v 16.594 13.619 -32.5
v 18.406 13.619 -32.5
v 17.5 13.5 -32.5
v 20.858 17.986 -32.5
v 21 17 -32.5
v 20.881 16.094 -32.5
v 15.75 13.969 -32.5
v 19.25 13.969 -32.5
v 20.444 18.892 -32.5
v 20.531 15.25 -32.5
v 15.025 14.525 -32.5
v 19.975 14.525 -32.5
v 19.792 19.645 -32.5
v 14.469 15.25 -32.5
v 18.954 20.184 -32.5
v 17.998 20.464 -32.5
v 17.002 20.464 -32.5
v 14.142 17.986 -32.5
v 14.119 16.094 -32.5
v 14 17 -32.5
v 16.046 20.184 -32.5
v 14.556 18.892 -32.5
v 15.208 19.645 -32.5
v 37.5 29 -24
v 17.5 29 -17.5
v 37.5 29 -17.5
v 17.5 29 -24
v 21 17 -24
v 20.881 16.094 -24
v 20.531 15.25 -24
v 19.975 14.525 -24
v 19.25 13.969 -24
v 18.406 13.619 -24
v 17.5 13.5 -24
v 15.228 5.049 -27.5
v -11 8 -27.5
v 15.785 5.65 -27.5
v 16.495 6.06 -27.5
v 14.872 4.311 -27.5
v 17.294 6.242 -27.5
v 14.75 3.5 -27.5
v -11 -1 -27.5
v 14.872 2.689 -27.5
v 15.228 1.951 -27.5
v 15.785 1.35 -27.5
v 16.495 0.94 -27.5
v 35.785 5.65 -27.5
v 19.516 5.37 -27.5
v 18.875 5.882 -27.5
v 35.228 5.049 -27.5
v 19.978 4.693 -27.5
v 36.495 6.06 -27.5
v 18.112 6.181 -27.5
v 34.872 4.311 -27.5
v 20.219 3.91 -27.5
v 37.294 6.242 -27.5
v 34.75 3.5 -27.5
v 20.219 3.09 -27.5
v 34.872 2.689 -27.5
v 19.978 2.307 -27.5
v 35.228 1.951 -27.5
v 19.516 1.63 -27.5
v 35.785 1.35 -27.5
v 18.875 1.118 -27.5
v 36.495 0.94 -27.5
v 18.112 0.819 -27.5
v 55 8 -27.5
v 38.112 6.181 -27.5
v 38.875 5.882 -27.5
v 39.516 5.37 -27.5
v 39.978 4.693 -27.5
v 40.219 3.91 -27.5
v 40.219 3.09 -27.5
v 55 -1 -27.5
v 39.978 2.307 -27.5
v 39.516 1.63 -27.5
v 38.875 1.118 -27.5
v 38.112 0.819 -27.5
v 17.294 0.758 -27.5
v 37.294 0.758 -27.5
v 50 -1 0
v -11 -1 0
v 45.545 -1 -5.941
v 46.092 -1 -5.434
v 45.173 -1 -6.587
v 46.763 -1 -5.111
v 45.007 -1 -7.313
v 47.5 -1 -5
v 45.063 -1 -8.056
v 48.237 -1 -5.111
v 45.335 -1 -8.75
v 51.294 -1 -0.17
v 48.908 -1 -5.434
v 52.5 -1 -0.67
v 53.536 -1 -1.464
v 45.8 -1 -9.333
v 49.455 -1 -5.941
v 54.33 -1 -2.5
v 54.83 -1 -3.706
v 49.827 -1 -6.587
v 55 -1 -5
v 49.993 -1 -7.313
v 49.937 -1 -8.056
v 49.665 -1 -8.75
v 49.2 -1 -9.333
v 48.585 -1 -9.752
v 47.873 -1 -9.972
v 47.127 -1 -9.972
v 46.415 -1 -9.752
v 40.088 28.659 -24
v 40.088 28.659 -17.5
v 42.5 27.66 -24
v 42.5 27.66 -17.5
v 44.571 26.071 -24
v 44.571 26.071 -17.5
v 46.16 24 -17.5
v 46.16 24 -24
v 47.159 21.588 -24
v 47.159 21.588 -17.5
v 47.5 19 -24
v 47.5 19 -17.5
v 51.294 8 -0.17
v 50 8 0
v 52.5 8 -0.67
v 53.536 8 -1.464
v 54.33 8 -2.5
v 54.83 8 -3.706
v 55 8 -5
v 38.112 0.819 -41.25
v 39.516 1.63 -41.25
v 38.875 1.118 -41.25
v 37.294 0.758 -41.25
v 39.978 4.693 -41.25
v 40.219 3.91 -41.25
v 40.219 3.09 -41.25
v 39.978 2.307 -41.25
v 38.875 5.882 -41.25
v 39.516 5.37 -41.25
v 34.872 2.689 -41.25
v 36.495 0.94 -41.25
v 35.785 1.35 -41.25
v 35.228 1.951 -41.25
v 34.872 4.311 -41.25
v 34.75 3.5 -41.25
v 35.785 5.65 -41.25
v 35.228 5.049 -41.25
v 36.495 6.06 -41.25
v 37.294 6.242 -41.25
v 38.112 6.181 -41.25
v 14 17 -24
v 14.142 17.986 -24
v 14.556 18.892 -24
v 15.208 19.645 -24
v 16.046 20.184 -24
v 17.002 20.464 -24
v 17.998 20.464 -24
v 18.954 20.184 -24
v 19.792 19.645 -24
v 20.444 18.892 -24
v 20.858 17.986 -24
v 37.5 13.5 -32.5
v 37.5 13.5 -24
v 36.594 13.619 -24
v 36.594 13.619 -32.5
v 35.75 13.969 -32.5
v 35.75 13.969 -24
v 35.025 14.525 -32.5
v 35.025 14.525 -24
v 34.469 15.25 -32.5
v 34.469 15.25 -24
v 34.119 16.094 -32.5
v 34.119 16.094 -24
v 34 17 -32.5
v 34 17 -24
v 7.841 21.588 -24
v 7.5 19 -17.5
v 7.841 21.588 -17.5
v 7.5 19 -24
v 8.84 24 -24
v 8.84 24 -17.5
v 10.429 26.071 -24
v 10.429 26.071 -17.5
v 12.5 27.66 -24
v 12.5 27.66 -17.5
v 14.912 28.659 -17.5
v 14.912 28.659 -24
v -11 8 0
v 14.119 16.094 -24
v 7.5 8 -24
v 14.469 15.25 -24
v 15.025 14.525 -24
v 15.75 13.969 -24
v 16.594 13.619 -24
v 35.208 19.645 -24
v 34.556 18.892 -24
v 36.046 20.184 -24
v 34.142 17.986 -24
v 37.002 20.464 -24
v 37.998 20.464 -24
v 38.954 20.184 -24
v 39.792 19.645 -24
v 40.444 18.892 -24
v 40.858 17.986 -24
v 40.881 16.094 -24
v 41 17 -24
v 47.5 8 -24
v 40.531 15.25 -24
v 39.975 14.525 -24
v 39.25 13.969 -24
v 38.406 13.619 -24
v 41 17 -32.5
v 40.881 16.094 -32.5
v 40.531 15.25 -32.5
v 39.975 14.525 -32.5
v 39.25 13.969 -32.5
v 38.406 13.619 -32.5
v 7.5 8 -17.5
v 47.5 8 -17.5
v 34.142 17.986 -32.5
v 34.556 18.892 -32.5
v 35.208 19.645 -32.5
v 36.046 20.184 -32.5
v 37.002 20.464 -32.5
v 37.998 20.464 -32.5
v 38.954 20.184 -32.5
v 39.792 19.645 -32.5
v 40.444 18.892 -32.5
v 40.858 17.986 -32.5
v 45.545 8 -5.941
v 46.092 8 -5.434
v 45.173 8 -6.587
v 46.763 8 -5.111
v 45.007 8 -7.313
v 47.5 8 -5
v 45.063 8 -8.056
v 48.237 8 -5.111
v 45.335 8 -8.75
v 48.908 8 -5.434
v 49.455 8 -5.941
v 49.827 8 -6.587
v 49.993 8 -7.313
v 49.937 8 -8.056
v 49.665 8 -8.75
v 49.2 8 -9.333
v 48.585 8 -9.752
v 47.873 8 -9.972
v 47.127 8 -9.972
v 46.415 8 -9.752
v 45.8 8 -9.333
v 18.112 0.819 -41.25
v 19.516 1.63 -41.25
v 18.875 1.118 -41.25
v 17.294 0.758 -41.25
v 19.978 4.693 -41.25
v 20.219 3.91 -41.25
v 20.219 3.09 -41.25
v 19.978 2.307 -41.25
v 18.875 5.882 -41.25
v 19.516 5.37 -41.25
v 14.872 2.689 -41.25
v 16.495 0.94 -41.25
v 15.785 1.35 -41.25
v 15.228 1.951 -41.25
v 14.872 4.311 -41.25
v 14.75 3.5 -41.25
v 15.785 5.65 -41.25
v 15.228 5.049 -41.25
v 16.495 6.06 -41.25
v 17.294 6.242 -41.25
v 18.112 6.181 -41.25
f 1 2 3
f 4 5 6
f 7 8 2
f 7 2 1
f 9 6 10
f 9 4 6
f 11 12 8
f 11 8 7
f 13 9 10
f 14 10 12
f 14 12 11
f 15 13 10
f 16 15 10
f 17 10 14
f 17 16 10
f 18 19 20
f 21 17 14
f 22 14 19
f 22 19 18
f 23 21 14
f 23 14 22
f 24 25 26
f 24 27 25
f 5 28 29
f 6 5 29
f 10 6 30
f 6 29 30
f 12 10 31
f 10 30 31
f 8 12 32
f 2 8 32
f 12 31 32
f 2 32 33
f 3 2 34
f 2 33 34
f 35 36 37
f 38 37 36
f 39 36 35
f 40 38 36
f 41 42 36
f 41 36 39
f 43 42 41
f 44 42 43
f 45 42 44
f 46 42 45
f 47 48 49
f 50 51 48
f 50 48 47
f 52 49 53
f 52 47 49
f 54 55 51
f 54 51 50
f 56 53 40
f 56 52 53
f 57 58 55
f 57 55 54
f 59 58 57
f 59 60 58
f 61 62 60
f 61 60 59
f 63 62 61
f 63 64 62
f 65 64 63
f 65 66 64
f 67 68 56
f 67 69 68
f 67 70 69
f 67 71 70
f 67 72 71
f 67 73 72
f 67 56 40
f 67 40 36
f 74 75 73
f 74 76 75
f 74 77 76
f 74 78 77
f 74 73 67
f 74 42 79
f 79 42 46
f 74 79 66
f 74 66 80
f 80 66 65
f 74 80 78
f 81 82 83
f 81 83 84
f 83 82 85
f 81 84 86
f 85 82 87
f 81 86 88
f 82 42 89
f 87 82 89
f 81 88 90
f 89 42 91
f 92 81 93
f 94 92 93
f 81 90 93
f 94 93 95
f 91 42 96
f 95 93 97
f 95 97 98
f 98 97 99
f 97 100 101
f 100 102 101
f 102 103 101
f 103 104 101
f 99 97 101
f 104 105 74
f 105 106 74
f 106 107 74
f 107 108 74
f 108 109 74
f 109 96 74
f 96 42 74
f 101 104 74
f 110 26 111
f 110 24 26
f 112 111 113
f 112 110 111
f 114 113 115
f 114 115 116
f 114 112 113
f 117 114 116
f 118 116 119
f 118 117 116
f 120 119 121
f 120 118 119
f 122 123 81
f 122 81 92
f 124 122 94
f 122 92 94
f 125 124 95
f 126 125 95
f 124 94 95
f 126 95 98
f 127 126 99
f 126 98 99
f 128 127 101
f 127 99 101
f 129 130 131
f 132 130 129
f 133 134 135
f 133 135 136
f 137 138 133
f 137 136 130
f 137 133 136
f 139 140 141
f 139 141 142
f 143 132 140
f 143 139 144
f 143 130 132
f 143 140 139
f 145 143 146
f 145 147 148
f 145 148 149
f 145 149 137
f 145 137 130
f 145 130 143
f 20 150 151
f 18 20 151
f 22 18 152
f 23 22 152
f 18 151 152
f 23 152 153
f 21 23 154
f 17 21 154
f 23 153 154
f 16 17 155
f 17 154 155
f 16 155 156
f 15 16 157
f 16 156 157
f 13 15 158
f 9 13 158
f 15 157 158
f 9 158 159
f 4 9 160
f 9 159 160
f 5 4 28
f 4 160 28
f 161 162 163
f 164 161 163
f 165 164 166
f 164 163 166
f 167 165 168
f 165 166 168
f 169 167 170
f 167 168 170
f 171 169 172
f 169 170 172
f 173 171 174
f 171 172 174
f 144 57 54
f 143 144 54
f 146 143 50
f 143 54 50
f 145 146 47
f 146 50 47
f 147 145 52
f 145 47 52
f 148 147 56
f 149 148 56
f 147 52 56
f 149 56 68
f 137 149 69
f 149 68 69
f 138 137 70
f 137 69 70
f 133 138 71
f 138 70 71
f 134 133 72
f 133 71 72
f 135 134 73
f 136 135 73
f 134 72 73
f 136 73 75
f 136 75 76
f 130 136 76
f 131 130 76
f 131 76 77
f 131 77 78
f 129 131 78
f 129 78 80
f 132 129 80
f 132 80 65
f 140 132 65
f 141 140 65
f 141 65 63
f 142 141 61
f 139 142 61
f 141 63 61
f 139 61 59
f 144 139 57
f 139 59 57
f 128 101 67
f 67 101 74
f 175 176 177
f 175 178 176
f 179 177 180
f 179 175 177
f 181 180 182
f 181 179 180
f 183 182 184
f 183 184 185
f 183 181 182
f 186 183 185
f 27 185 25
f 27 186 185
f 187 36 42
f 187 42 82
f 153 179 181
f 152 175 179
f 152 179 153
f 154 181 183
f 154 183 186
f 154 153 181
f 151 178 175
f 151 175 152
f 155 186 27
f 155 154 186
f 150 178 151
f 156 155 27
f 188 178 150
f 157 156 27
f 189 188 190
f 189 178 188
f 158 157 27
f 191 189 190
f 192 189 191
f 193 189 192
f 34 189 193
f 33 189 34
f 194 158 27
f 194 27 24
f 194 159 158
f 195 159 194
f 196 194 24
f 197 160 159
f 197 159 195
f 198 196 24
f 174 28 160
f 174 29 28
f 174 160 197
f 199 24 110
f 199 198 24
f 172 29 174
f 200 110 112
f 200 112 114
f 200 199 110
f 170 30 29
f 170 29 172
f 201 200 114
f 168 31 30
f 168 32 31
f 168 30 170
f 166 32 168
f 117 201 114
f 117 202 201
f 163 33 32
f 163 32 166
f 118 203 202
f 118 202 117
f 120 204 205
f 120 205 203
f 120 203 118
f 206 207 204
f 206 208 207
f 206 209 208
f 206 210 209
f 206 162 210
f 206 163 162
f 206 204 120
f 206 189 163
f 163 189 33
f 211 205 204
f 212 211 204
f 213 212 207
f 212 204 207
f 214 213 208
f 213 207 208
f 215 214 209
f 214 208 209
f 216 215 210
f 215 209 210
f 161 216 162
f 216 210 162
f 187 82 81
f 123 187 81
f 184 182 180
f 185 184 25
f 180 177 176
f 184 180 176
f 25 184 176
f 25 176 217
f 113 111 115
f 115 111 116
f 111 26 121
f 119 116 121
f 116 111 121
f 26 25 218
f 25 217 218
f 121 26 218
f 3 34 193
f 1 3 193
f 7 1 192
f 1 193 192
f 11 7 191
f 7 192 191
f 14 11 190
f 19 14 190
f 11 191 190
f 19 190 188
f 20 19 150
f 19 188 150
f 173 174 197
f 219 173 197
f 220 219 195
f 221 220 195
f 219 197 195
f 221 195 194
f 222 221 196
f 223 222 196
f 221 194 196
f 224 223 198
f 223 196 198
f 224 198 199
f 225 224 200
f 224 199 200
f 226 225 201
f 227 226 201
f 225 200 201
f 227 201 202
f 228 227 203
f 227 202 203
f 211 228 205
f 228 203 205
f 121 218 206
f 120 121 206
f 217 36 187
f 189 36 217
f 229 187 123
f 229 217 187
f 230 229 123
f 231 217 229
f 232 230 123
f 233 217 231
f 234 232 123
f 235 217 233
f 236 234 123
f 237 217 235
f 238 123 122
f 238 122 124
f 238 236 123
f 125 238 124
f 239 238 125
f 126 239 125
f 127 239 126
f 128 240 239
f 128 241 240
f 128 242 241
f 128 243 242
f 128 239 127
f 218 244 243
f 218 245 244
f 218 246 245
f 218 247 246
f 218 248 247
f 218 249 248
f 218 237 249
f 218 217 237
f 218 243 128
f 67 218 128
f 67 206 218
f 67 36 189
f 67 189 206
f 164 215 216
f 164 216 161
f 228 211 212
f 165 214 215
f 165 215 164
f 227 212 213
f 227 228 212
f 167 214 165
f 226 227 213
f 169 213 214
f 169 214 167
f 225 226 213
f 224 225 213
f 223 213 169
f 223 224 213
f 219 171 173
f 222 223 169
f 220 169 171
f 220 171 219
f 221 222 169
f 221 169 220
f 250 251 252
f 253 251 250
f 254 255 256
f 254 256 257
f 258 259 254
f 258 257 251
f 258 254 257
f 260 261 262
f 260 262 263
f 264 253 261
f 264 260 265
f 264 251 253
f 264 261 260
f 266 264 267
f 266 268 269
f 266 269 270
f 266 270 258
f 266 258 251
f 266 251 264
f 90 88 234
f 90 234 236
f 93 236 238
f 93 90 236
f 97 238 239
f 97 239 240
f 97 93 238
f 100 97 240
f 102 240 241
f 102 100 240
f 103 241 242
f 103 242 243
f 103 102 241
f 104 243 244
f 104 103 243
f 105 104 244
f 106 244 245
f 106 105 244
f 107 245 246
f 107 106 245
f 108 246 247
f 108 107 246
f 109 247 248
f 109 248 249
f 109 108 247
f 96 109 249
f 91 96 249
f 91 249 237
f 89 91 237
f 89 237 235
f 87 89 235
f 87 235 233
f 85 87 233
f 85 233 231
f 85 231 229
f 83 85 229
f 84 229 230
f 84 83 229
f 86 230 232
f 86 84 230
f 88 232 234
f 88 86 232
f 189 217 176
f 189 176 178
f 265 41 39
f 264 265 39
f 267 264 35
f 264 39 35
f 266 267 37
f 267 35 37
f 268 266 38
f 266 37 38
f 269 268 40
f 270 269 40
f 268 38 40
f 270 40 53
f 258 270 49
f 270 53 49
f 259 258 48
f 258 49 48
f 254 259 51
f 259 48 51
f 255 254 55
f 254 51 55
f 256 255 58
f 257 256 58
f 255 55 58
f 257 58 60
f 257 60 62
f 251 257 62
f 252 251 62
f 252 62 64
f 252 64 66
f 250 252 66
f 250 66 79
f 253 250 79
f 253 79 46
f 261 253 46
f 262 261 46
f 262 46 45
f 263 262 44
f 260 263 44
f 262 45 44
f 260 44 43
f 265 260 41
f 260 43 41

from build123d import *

# Parameters (mm, degrees)
BOSS_EXTRUDE2_DEPTH      = 8
BOSS_EXTRUDE2_DEPTH_BACK = 1
SKETCH1_R                = 2.5
CUT_EXTRUDE1_START       = -18
SKETCH2_R                = 2.5
CUT_EXTRUDE1_DEPTH       = 18
SKETCH3_R                = 2.75
BOSS_EXTRUDE3_DEPTH      = 13.75
SKETCH4_W                = 9
SKETCH4_H                = 6.5
BOSS_EXTRUDE4_DEPTH      = 15
BOSS_EXTRUDE5_DEPTH      = 8.5
SKETCH8_W                = 9
SKETCH8_H                = 6.5
BOSS_EXTRUDE6_DEPTH      = 6
SKETCH9_W                = 15.5
SKETCH9_H                = 6.5
BOSS_EXTRUDE7_DEPTH      = 21
SKETCH10_R               = 3.5
BOSS_EXTRUDE8_DEPTH      = 8.5
CUT_EXTRUDE2_START       = -8.5
SKETCH12_R               = 3.5
CUT_EXTRUDE2_DEPTH       = 8.5
FILLET1_R                = 10
BOSS_EXTRUDE9_DEPTH      = 11
BOSS_EXTRUDE9_DEPTH_BACK = 10
SKETCH13_W               = 27.5
SKETCH13_H               = 9


with BuildPart() as part:
    # Sketch1 → Boss-Extrude2 (new, two sides: drawn at the far end of the back side and taken through both)
    with BuildSketch(Plane(origin=(0, 0, 0), x_dir=(1, 0, 0), z_dir=(0, 1, 0)).offset(-BOSS_EXTRUDE2_DEPTH_BACK)):
        with BuildLine():
            Line((5, 0), (50, 0))
            ThreePointArc((50, 0), (53.535533906, 1.464466094), (55, 5))
            Line((55, 5), (55, 50))
            ThreePointArc((55, 50), (53.535533906, 53.535533906), (50, 55))
            Line((50, 55), (5, 55))
            ThreePointArc((5, 55), (1.464466094, 53.535533906), (0, 50))
            Line((0, 50), (0, 5))
            ThreePointArc((0, 5), (1.464466094, 1.464466094), (5, 0))
        make_face()
        with Locations((7.5, 47.5)):
            Circle(SKETCH1_R, mode=Mode.SUBTRACT)
        with Locations((47.5, 47.5)):
            Circle(SKETCH1_R, mode=Mode.SUBTRACT)
        with Locations((47.5, 7.5)):
            Circle(SKETCH1_R, mode=Mode.SUBTRACT)
        with Locations((7.5, 7.5)):
            Circle(SKETCH1_R, mode=Mode.SUBTRACT)
    extrude(amount=BOSS_EXTRUDE2_DEPTH + BOSS_EXTRUDE2_DEPTH_BACK)

    # Sketch2 → Cut-Extrude1 (cut)
    with BuildSketch(Plane(origin=(0, 8, 0), x_dir=(1, 0, 0), z_dir=(0, 1, 0)).offset(CUT_EXTRUDE1_START)):
        with BuildLine():
            Line((0, 50), (0, 27.5))
            Line((0, 27.5), (55, 27.5))
            Line((55, 27.5), (55, 50))
            ThreePointArc((55, 50), (53.535533906, 53.535533906), (50, 55))
            Line((50, 55), (5, 55))
            ThreePointArc((5, 55), (1.464466094, 53.535533906), (0, 50))
        make_face()
        with Locations((7.5, 47.5)):
            Circle(SKETCH2_R, mode=Mode.SUBTRACT)
        with Locations((47.5, 47.5)):
            Circle(SKETCH2_R, mode=Mode.SUBTRACT)
    extrude(amount=CUT_EXTRUDE1_DEPTH, mode=Mode.SUBTRACT)

    # Sketch3 → Boss-Extrude3 (add)
    with BuildSketch(Plane(origin=(0, 0, -27.5), x_dir=(-1, 0, 0), z_dir=(0, 0, -1))):
        with Locations((-37.5, 3.5)):
            Circle(SKETCH3_R)
        with Locations((-17.5, 3.5)):
            Circle(SKETCH3_R)
    extrude(amount=BOSS_EXTRUDE3_DEPTH)

    # Sketch4 → Boss-Extrude4 (add)
    with BuildSketch(Plane(origin=(0, 8, 0), x_dir=(1, 0, 0), z_dir=(0, 1, 0))):
        with Locations((27.5, 20.75)):
            Rectangle(SKETCH4_W, SKETCH4_H)
    extrude(amount=BOSS_EXTRUDE4_DEPTH)

    # Sketch5 → Boss-Extrude5 (add)
    with BuildSketch(Plane(origin=(0, 0, -24), x_dir=(-1, 0, 0), z_dir=(0, 0, -1))):
        with BuildLine():
            ThreePointArc((-25.636419782, 13.037388184), (-24.436298745, 14.307742745), (-24, 16))
            ThreePointArc((-24, 16), (-29.974873734, 18.474873734), (-27.5, 12.5))
            ThreePointArc((-27.5, 12.5), (-26.685966178, 12.595980474), (-25.916578842, 12.878657751))
            ThreePointArc((-25.916578842, 12.878657751), (-25.85405917, 13.094916041), (-25.636419782, 13.037388184))
        make_face()
    extrude(amount=BOSS_EXTRUDE5_DEPTH)

    # Sketch8 → Boss-Extrude6 (add)
    with BuildSketch(Plane(origin=(0, 23, 0), x_dir=(1, 0, 0), z_dir=(0, 1, 0))):
        with Locations((27.5, 20.75)):
            Rectangle(SKETCH8_W, SKETCH8_H)
    extrude(amount=BOSS_EXTRUDE6_DEPTH)

    # Sketch9 → Boss-Extrude7 (add)
    with BuildSketch(Plane(origin=(0, 8, 0), x_dir=(1, 0, 0), z_dir=(0, 1, 0))):
        with Locations((39.75, 20.75)):
            Rectangle(SKETCH9_W, SKETCH9_H)
        with Locations((15.25, 20.75)):
            Rectangle(SKETCH9_W, SKETCH9_H)
    extrude(amount=BOSS_EXTRUDE7_DEPTH)

    # Sketch10 → Boss-Extrude8 (add)
    with BuildSketch(Plane(origin=(0, 0, -24), x_dir=(-1, 0, 0), z_dir=(0, 0, -1))):
        with Locations((-17.5, 17)):
            Circle(SKETCH10_R)
        with Locations((-37.5, 17)):
            Circle(SKETCH10_R)
    extrude(amount=BOSS_EXTRUDE8_DEPTH)

    # Sketch12 → Cut-Extrude2 (cut)
    with BuildSketch(Plane(origin=(0, 0, -32.5), x_dir=(-1, 0, 0), z_dir=(0, 0, -1)).offset(CUT_EXTRUDE2_START)):
        with Locations((-27.5, 16)):
            Circle(SKETCH12_R)
    extrude(amount=CUT_EXTRUDE2_DEPTH, mode=Mode.SUBTRACT)

    # Fillet1
    fillet1_edges = [part.edges().sort_by_distance(p)[0] for p in [
        (47.5, 29, -20.75),
        (7.5, 29, -20.75),
    ]]
    fillet(fillet1_edges, radius=FILLET1_R)

    # Sketch13 → Boss-Extrude9 (add, two sides: drawn at the far end of the back side and taken through both)
    with BuildSketch(Plane.ZY.offset(-BOSS_EXTRUDE9_DEPTH_BACK)):
        with Locations((-13.75, 3.5)):
            Rectangle(SKETCH13_W, SKETCH13_H)
    extrude(amount=BOSS_EXTRUDE9_DEPTH + BOSS_EXTRUDE9_DEPTH_BACK)


solid = part.part
